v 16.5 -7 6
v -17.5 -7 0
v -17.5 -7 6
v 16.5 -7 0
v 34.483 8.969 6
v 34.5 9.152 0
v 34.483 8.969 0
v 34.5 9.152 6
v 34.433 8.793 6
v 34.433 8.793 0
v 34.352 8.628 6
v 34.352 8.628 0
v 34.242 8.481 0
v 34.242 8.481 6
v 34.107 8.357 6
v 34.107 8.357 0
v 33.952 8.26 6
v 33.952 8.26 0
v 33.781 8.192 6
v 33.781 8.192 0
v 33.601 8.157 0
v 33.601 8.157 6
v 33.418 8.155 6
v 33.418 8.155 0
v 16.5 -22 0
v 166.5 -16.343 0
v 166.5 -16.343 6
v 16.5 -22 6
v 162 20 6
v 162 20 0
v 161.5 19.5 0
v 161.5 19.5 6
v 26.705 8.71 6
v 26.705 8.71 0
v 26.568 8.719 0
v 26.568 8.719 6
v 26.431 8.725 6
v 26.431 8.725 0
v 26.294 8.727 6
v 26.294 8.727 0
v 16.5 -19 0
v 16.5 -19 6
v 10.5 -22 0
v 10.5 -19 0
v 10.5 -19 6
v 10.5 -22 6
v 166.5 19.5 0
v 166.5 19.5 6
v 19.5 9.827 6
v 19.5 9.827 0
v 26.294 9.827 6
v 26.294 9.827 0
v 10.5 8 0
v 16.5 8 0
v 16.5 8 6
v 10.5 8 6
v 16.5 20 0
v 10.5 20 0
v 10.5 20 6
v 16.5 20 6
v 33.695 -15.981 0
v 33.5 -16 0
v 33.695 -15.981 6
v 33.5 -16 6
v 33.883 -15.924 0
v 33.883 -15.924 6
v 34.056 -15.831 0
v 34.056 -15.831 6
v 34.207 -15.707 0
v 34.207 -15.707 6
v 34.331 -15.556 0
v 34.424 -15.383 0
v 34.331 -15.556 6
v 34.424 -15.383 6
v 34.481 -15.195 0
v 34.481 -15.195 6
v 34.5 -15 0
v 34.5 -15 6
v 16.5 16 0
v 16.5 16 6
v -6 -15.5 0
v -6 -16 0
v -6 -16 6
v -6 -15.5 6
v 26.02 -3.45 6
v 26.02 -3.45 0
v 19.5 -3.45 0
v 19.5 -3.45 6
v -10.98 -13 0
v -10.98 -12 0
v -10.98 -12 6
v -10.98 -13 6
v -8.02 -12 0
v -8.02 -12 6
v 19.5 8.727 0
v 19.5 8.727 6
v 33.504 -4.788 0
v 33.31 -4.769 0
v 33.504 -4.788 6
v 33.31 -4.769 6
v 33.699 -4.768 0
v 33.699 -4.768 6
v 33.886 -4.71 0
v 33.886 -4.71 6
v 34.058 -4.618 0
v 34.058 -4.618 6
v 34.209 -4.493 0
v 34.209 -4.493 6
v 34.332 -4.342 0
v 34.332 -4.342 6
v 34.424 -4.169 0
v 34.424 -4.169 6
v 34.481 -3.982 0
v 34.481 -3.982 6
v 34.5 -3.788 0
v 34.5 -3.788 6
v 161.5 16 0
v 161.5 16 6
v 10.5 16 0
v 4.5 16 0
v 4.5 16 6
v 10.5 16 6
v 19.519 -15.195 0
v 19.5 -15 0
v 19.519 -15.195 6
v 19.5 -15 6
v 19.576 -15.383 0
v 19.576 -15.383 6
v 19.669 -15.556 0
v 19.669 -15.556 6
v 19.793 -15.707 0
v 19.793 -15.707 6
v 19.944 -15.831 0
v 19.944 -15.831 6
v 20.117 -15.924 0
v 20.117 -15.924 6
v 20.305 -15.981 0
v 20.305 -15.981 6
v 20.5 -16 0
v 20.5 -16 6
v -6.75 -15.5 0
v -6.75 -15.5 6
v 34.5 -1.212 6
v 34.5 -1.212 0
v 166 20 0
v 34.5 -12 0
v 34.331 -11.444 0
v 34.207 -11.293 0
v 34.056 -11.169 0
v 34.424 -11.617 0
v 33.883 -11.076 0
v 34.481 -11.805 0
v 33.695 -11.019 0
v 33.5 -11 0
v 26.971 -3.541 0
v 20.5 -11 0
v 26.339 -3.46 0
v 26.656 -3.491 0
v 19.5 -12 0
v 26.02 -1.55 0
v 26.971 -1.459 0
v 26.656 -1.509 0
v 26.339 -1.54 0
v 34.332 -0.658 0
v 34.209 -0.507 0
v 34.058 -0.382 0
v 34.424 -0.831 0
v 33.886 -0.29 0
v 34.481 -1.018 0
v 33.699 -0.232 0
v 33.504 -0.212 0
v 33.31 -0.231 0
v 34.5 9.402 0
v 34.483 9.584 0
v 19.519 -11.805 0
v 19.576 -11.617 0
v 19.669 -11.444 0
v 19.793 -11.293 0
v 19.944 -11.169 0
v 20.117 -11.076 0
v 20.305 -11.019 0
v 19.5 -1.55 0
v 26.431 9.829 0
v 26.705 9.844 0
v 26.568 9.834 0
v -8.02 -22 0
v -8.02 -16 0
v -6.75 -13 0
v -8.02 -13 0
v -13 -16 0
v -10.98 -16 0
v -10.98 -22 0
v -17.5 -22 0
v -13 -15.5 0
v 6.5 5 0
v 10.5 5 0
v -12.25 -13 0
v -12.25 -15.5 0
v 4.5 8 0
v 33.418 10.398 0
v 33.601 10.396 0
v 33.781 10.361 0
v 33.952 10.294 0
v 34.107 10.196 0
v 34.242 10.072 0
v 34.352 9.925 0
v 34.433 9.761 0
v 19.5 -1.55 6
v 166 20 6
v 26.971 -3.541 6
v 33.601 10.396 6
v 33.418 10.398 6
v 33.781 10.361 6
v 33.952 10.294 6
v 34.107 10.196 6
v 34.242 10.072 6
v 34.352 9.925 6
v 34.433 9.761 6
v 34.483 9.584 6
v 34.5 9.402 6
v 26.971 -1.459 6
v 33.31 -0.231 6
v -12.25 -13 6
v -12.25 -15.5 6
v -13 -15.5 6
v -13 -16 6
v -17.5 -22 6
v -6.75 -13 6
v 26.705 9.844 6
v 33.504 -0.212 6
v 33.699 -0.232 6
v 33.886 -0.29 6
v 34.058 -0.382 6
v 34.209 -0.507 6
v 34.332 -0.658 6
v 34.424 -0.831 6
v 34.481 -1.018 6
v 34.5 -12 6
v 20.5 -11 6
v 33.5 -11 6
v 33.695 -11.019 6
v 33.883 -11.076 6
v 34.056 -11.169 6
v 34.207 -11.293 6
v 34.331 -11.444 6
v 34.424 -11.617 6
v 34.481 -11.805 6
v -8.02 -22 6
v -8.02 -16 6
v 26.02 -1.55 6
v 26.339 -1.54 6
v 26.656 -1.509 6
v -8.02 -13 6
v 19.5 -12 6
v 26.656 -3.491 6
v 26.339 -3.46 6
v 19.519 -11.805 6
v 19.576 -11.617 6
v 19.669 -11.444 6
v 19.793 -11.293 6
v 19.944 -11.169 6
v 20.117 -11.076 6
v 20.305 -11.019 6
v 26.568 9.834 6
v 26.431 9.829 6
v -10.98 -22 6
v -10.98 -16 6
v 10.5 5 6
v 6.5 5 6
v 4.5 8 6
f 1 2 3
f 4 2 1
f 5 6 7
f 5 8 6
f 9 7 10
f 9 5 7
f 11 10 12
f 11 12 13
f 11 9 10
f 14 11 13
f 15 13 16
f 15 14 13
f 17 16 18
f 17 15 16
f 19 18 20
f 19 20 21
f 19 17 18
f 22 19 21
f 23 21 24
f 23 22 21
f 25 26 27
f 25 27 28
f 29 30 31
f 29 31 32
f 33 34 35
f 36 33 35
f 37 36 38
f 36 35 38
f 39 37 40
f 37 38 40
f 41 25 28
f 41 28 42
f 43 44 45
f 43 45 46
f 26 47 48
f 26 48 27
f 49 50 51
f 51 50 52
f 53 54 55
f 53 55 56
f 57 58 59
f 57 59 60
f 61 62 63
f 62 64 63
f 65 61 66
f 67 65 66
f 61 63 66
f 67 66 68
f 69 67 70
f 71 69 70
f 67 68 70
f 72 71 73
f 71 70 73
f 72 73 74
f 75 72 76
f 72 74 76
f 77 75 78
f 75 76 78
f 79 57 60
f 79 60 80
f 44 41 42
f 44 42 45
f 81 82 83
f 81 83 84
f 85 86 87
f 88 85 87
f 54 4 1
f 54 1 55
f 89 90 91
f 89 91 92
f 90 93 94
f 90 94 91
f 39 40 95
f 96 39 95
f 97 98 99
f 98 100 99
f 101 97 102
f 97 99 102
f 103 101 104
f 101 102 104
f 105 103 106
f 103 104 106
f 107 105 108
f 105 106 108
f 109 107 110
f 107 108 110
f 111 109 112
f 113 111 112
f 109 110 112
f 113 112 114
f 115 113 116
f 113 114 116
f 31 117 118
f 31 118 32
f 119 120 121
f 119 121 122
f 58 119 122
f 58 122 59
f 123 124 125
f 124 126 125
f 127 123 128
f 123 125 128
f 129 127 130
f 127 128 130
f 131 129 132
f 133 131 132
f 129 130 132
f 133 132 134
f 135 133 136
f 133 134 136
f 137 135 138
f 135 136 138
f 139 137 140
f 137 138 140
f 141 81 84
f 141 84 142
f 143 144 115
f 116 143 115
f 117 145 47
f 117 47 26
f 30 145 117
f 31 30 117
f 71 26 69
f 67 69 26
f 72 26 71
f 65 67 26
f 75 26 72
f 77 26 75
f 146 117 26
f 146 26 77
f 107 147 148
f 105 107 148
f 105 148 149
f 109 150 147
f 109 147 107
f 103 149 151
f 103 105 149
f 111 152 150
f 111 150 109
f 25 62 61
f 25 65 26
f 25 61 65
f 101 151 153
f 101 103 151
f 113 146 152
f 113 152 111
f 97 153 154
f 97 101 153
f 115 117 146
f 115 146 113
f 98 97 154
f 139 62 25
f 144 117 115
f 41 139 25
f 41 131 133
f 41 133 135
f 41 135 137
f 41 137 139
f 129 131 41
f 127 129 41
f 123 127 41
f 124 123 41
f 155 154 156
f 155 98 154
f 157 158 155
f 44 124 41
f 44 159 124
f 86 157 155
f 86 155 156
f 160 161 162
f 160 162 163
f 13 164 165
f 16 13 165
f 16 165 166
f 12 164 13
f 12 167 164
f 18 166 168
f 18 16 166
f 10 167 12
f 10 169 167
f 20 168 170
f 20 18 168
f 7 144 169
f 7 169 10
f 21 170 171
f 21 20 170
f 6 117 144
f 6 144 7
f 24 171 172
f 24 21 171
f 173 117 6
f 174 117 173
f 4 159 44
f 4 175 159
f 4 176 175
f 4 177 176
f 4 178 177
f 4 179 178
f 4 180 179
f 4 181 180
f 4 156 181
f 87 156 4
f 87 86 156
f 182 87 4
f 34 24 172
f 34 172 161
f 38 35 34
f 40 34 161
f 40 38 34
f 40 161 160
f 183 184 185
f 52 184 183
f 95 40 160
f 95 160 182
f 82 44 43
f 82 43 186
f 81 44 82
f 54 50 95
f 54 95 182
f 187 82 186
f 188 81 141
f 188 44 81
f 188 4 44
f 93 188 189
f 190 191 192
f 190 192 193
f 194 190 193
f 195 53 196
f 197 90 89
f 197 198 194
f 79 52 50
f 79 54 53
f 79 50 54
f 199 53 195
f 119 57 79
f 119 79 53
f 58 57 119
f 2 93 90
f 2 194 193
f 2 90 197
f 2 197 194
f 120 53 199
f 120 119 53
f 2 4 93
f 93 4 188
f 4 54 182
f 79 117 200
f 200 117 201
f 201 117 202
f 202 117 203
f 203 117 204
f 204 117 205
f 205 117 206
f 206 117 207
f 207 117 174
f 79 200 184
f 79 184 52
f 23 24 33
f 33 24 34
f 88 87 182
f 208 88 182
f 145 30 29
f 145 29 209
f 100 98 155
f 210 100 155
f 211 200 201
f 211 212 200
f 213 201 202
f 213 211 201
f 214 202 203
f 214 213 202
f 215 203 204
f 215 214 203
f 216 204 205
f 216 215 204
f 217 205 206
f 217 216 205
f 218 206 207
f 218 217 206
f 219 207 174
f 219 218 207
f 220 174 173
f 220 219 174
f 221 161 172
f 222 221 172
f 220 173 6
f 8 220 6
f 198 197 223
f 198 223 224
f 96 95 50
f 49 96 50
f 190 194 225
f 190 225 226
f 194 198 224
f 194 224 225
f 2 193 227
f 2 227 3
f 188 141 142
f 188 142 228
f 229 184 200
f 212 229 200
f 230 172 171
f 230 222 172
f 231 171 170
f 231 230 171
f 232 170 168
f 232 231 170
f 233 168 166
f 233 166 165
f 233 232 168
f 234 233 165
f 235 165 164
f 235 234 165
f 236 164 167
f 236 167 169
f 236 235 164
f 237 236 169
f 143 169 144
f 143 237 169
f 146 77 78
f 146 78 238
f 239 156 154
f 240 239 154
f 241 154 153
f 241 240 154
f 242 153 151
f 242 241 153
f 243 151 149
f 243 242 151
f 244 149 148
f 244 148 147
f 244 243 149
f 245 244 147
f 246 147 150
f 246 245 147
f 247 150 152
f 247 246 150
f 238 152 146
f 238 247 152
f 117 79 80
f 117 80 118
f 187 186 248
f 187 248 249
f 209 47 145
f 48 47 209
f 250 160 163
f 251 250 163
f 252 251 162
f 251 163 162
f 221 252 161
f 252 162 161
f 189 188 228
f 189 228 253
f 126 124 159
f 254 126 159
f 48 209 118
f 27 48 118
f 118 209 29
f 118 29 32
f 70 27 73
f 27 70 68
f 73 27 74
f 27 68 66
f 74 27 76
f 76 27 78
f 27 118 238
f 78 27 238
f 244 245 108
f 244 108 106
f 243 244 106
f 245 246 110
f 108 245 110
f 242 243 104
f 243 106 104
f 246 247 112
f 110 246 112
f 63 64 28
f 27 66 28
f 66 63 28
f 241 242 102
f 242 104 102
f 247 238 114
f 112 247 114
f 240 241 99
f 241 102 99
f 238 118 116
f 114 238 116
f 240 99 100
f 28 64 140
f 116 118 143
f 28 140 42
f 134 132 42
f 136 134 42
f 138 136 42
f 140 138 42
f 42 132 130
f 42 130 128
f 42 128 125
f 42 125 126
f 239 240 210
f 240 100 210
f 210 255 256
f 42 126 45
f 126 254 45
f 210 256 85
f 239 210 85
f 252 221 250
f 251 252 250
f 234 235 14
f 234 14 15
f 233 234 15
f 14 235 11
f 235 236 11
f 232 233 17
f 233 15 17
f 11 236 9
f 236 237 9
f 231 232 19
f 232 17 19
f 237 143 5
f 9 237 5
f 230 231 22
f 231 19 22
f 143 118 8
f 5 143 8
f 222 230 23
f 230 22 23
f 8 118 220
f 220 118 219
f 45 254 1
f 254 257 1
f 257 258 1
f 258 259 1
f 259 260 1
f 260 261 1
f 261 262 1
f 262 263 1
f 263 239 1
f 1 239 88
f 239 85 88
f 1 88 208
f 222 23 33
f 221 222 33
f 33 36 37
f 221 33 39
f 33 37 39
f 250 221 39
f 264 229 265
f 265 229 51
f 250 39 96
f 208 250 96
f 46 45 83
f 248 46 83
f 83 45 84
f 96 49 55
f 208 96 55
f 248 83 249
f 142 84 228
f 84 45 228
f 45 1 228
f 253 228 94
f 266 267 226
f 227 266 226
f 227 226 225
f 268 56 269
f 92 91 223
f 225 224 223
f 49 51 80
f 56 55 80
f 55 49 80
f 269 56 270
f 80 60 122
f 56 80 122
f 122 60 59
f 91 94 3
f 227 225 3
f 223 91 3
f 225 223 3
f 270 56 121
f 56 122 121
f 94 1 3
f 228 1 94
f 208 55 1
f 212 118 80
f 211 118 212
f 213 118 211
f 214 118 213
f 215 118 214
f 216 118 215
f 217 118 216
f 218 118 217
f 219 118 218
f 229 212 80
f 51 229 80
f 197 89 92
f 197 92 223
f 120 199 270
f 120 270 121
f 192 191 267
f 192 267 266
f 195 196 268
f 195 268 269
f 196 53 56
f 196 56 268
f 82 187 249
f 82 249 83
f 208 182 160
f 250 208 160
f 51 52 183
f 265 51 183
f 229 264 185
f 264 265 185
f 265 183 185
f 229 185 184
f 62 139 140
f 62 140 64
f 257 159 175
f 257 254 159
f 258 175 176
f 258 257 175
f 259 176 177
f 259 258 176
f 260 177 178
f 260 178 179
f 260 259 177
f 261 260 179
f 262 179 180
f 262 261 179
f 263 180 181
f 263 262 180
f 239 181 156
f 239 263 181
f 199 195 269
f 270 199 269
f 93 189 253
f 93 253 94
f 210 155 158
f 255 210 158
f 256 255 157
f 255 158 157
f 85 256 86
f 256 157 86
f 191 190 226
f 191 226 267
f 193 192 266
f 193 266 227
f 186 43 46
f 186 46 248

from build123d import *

# Parameters (mm, degrees)
SKETCH1_W           = 15
SKETCH1_H           = 5
BOSS_EXTRUDE1_DEPTH = 6
CHAMFER1_SIZE       = 3
CHAMFER1_SIZE2      = 2
FILLET1_R           = 1
FILLET2_R           = 5
CHAMFER2_SIZE       = 0.5


with BuildPart() as part:
    # Sketch1 → Boss-Extrude1 (new body)
    with BuildSketch(Plane.XY):
        Polygon((-17.5, -7), (16.5, -7), (16.5, 8), (10.5, 8), (10.5, 5), (4.5, 5), (4.5, 16), (10.5, 16), (10.5, 20), (16.5, 20), (16.5, 16), (161.5, 16), (161.5, 20), (166.5, 20), (166.5, -16.342859565), (16.5, -22), (16.5, -19), (10.5, -19), (10.5, -22), (-8.02, -22), (-8.02, -16), (-6, -16), (-6, -15.5), (-6.75, -15.5), (-6.75, -13), (-8.02, -13), (-8.02, -12), (-10.98, -12), (-10.98, -13), (-12.25, -13), (-12.25, -15.5), (-13, -15.5), (-13, -16), (-10.98, -16), (-10.98, -22), (-17.5, -22), align=None)
        Polygon((19.5, -3.45), (19.5, -1.55), (26.5, -1.55), (34.5, 0), (34.5, -5), (26.5, -3.45), align=None, mode=Mode.SUBTRACT)
        with Locations((27, -13.5)):
            Rectangle(SKETCH1_W, SKETCH1_H, mode=Mode.SUBTRACT)
        Polygon((19.5, 8.726722117), (19.5, 9.826722117), (26.5, 9.826722117), (34.5, 10.487607038), (34.5, 8.065837195), (26.5, 8.726722117), align=None, mode=Mode.SUBTRACT)
    extrude(amount=BOSS_EXTRUDE1_DEPTH)

    # Chamfer1
    chamfer1_edges = [part.edges().sort_by_distance(p)[0] for p in [
        (4.5, 5, 3),
    ]]
    chamfer1_side = [part.faces().sort_by_distance(p)[0] for p in [
        (4.5, 10.5, 3),
    ]]
    chamfer(chamfer1_edges, length=CHAMFER1_SIZE, length2=CHAMFER1_SIZE2, reference=chamfer1_side[0])

    # Fillet1
    fillet1_edges = [part.edges().sort_by_distance(p)[0] for p in [
        (19.5, -16, 3),
        (34.5, -16, 3),
        (34.5, -11, 3),
        (19.5, -11, 3),
        (34.5, 8.065837195, 3),
        (34.5, 10.487607038, 3),
        (34.5, -5, 3),
        (34.5, 0, 3),
    ]]
    fillet(fillet1_edges, radius=FILLET1_R)

    # Fillet2
    # the kernel refuses this fillet: 5 mm, written as the material it takes off along each edge
    with BuildSketch(Plane(origin=(26.5, 8.726722117, -0.515438436), x_dir=(0.9966051096378002, -0.08233016120370525, 0), z_dir=(0, 0, 1)), Plane(origin=(26.5, 9.826722117, -0.515438436), x_dir=(-1, 0, 0), z_dir=(0, 0, 1))) as fillet2_piece_1:
        with BuildLine():
            CenterArc((FILLET2_R * 0.041235074881, -FILLET2_R), FILLET2_R, 90, 4.722516116)
            Line((-FILLET2_R * 0.0410950863227, -FILLET2_R * 0.0033948903622), (0, 0))
            Line((0, 0), (FILLET2_R * 0.041235074881, 0))
        make_face()
    extrude(amount=7.030876872, mode=Mode.SUBTRACT)
    with BuildSketch(Plane(origin=(26.5, -3.45, -1.199781563), x_dir=(0.9817429059156794, -0.19021268802116595, 0), z_dir=(0, 0, 1)), Plane(origin=(26.5, -1.55, -1.199781563), x_dir=(-1, 0, 0), z_dir=(0, 0, 1))) as fillet2_piece_2:
        with BuildLine():
            CenterArc((FILLET2_R * 0.0959825250053, -FILLET2_R), FILLET2_R, 90, 10.965196685)
            Line((-FILLET2_R * 0.0942301630158, -FILLET2_R * 0.0182570940843), (0, 0))
            Line((0, 0), (FILLET2_R * 0.0959825250053, 0))
        make_face()
    extrude(amount=8.399563125, mode=Mode.SUBTRACT)

    # Chamfer2
    chamfer2_edges = [part.edges().sort_by_distance(p)[0] for p in [
        (161.5, 20, 3),
        (166.5, 20, 3),
    ]]
    chamfer(chamfer2_edges, length=CHAMFER2_SIZE)


solid = part.part
